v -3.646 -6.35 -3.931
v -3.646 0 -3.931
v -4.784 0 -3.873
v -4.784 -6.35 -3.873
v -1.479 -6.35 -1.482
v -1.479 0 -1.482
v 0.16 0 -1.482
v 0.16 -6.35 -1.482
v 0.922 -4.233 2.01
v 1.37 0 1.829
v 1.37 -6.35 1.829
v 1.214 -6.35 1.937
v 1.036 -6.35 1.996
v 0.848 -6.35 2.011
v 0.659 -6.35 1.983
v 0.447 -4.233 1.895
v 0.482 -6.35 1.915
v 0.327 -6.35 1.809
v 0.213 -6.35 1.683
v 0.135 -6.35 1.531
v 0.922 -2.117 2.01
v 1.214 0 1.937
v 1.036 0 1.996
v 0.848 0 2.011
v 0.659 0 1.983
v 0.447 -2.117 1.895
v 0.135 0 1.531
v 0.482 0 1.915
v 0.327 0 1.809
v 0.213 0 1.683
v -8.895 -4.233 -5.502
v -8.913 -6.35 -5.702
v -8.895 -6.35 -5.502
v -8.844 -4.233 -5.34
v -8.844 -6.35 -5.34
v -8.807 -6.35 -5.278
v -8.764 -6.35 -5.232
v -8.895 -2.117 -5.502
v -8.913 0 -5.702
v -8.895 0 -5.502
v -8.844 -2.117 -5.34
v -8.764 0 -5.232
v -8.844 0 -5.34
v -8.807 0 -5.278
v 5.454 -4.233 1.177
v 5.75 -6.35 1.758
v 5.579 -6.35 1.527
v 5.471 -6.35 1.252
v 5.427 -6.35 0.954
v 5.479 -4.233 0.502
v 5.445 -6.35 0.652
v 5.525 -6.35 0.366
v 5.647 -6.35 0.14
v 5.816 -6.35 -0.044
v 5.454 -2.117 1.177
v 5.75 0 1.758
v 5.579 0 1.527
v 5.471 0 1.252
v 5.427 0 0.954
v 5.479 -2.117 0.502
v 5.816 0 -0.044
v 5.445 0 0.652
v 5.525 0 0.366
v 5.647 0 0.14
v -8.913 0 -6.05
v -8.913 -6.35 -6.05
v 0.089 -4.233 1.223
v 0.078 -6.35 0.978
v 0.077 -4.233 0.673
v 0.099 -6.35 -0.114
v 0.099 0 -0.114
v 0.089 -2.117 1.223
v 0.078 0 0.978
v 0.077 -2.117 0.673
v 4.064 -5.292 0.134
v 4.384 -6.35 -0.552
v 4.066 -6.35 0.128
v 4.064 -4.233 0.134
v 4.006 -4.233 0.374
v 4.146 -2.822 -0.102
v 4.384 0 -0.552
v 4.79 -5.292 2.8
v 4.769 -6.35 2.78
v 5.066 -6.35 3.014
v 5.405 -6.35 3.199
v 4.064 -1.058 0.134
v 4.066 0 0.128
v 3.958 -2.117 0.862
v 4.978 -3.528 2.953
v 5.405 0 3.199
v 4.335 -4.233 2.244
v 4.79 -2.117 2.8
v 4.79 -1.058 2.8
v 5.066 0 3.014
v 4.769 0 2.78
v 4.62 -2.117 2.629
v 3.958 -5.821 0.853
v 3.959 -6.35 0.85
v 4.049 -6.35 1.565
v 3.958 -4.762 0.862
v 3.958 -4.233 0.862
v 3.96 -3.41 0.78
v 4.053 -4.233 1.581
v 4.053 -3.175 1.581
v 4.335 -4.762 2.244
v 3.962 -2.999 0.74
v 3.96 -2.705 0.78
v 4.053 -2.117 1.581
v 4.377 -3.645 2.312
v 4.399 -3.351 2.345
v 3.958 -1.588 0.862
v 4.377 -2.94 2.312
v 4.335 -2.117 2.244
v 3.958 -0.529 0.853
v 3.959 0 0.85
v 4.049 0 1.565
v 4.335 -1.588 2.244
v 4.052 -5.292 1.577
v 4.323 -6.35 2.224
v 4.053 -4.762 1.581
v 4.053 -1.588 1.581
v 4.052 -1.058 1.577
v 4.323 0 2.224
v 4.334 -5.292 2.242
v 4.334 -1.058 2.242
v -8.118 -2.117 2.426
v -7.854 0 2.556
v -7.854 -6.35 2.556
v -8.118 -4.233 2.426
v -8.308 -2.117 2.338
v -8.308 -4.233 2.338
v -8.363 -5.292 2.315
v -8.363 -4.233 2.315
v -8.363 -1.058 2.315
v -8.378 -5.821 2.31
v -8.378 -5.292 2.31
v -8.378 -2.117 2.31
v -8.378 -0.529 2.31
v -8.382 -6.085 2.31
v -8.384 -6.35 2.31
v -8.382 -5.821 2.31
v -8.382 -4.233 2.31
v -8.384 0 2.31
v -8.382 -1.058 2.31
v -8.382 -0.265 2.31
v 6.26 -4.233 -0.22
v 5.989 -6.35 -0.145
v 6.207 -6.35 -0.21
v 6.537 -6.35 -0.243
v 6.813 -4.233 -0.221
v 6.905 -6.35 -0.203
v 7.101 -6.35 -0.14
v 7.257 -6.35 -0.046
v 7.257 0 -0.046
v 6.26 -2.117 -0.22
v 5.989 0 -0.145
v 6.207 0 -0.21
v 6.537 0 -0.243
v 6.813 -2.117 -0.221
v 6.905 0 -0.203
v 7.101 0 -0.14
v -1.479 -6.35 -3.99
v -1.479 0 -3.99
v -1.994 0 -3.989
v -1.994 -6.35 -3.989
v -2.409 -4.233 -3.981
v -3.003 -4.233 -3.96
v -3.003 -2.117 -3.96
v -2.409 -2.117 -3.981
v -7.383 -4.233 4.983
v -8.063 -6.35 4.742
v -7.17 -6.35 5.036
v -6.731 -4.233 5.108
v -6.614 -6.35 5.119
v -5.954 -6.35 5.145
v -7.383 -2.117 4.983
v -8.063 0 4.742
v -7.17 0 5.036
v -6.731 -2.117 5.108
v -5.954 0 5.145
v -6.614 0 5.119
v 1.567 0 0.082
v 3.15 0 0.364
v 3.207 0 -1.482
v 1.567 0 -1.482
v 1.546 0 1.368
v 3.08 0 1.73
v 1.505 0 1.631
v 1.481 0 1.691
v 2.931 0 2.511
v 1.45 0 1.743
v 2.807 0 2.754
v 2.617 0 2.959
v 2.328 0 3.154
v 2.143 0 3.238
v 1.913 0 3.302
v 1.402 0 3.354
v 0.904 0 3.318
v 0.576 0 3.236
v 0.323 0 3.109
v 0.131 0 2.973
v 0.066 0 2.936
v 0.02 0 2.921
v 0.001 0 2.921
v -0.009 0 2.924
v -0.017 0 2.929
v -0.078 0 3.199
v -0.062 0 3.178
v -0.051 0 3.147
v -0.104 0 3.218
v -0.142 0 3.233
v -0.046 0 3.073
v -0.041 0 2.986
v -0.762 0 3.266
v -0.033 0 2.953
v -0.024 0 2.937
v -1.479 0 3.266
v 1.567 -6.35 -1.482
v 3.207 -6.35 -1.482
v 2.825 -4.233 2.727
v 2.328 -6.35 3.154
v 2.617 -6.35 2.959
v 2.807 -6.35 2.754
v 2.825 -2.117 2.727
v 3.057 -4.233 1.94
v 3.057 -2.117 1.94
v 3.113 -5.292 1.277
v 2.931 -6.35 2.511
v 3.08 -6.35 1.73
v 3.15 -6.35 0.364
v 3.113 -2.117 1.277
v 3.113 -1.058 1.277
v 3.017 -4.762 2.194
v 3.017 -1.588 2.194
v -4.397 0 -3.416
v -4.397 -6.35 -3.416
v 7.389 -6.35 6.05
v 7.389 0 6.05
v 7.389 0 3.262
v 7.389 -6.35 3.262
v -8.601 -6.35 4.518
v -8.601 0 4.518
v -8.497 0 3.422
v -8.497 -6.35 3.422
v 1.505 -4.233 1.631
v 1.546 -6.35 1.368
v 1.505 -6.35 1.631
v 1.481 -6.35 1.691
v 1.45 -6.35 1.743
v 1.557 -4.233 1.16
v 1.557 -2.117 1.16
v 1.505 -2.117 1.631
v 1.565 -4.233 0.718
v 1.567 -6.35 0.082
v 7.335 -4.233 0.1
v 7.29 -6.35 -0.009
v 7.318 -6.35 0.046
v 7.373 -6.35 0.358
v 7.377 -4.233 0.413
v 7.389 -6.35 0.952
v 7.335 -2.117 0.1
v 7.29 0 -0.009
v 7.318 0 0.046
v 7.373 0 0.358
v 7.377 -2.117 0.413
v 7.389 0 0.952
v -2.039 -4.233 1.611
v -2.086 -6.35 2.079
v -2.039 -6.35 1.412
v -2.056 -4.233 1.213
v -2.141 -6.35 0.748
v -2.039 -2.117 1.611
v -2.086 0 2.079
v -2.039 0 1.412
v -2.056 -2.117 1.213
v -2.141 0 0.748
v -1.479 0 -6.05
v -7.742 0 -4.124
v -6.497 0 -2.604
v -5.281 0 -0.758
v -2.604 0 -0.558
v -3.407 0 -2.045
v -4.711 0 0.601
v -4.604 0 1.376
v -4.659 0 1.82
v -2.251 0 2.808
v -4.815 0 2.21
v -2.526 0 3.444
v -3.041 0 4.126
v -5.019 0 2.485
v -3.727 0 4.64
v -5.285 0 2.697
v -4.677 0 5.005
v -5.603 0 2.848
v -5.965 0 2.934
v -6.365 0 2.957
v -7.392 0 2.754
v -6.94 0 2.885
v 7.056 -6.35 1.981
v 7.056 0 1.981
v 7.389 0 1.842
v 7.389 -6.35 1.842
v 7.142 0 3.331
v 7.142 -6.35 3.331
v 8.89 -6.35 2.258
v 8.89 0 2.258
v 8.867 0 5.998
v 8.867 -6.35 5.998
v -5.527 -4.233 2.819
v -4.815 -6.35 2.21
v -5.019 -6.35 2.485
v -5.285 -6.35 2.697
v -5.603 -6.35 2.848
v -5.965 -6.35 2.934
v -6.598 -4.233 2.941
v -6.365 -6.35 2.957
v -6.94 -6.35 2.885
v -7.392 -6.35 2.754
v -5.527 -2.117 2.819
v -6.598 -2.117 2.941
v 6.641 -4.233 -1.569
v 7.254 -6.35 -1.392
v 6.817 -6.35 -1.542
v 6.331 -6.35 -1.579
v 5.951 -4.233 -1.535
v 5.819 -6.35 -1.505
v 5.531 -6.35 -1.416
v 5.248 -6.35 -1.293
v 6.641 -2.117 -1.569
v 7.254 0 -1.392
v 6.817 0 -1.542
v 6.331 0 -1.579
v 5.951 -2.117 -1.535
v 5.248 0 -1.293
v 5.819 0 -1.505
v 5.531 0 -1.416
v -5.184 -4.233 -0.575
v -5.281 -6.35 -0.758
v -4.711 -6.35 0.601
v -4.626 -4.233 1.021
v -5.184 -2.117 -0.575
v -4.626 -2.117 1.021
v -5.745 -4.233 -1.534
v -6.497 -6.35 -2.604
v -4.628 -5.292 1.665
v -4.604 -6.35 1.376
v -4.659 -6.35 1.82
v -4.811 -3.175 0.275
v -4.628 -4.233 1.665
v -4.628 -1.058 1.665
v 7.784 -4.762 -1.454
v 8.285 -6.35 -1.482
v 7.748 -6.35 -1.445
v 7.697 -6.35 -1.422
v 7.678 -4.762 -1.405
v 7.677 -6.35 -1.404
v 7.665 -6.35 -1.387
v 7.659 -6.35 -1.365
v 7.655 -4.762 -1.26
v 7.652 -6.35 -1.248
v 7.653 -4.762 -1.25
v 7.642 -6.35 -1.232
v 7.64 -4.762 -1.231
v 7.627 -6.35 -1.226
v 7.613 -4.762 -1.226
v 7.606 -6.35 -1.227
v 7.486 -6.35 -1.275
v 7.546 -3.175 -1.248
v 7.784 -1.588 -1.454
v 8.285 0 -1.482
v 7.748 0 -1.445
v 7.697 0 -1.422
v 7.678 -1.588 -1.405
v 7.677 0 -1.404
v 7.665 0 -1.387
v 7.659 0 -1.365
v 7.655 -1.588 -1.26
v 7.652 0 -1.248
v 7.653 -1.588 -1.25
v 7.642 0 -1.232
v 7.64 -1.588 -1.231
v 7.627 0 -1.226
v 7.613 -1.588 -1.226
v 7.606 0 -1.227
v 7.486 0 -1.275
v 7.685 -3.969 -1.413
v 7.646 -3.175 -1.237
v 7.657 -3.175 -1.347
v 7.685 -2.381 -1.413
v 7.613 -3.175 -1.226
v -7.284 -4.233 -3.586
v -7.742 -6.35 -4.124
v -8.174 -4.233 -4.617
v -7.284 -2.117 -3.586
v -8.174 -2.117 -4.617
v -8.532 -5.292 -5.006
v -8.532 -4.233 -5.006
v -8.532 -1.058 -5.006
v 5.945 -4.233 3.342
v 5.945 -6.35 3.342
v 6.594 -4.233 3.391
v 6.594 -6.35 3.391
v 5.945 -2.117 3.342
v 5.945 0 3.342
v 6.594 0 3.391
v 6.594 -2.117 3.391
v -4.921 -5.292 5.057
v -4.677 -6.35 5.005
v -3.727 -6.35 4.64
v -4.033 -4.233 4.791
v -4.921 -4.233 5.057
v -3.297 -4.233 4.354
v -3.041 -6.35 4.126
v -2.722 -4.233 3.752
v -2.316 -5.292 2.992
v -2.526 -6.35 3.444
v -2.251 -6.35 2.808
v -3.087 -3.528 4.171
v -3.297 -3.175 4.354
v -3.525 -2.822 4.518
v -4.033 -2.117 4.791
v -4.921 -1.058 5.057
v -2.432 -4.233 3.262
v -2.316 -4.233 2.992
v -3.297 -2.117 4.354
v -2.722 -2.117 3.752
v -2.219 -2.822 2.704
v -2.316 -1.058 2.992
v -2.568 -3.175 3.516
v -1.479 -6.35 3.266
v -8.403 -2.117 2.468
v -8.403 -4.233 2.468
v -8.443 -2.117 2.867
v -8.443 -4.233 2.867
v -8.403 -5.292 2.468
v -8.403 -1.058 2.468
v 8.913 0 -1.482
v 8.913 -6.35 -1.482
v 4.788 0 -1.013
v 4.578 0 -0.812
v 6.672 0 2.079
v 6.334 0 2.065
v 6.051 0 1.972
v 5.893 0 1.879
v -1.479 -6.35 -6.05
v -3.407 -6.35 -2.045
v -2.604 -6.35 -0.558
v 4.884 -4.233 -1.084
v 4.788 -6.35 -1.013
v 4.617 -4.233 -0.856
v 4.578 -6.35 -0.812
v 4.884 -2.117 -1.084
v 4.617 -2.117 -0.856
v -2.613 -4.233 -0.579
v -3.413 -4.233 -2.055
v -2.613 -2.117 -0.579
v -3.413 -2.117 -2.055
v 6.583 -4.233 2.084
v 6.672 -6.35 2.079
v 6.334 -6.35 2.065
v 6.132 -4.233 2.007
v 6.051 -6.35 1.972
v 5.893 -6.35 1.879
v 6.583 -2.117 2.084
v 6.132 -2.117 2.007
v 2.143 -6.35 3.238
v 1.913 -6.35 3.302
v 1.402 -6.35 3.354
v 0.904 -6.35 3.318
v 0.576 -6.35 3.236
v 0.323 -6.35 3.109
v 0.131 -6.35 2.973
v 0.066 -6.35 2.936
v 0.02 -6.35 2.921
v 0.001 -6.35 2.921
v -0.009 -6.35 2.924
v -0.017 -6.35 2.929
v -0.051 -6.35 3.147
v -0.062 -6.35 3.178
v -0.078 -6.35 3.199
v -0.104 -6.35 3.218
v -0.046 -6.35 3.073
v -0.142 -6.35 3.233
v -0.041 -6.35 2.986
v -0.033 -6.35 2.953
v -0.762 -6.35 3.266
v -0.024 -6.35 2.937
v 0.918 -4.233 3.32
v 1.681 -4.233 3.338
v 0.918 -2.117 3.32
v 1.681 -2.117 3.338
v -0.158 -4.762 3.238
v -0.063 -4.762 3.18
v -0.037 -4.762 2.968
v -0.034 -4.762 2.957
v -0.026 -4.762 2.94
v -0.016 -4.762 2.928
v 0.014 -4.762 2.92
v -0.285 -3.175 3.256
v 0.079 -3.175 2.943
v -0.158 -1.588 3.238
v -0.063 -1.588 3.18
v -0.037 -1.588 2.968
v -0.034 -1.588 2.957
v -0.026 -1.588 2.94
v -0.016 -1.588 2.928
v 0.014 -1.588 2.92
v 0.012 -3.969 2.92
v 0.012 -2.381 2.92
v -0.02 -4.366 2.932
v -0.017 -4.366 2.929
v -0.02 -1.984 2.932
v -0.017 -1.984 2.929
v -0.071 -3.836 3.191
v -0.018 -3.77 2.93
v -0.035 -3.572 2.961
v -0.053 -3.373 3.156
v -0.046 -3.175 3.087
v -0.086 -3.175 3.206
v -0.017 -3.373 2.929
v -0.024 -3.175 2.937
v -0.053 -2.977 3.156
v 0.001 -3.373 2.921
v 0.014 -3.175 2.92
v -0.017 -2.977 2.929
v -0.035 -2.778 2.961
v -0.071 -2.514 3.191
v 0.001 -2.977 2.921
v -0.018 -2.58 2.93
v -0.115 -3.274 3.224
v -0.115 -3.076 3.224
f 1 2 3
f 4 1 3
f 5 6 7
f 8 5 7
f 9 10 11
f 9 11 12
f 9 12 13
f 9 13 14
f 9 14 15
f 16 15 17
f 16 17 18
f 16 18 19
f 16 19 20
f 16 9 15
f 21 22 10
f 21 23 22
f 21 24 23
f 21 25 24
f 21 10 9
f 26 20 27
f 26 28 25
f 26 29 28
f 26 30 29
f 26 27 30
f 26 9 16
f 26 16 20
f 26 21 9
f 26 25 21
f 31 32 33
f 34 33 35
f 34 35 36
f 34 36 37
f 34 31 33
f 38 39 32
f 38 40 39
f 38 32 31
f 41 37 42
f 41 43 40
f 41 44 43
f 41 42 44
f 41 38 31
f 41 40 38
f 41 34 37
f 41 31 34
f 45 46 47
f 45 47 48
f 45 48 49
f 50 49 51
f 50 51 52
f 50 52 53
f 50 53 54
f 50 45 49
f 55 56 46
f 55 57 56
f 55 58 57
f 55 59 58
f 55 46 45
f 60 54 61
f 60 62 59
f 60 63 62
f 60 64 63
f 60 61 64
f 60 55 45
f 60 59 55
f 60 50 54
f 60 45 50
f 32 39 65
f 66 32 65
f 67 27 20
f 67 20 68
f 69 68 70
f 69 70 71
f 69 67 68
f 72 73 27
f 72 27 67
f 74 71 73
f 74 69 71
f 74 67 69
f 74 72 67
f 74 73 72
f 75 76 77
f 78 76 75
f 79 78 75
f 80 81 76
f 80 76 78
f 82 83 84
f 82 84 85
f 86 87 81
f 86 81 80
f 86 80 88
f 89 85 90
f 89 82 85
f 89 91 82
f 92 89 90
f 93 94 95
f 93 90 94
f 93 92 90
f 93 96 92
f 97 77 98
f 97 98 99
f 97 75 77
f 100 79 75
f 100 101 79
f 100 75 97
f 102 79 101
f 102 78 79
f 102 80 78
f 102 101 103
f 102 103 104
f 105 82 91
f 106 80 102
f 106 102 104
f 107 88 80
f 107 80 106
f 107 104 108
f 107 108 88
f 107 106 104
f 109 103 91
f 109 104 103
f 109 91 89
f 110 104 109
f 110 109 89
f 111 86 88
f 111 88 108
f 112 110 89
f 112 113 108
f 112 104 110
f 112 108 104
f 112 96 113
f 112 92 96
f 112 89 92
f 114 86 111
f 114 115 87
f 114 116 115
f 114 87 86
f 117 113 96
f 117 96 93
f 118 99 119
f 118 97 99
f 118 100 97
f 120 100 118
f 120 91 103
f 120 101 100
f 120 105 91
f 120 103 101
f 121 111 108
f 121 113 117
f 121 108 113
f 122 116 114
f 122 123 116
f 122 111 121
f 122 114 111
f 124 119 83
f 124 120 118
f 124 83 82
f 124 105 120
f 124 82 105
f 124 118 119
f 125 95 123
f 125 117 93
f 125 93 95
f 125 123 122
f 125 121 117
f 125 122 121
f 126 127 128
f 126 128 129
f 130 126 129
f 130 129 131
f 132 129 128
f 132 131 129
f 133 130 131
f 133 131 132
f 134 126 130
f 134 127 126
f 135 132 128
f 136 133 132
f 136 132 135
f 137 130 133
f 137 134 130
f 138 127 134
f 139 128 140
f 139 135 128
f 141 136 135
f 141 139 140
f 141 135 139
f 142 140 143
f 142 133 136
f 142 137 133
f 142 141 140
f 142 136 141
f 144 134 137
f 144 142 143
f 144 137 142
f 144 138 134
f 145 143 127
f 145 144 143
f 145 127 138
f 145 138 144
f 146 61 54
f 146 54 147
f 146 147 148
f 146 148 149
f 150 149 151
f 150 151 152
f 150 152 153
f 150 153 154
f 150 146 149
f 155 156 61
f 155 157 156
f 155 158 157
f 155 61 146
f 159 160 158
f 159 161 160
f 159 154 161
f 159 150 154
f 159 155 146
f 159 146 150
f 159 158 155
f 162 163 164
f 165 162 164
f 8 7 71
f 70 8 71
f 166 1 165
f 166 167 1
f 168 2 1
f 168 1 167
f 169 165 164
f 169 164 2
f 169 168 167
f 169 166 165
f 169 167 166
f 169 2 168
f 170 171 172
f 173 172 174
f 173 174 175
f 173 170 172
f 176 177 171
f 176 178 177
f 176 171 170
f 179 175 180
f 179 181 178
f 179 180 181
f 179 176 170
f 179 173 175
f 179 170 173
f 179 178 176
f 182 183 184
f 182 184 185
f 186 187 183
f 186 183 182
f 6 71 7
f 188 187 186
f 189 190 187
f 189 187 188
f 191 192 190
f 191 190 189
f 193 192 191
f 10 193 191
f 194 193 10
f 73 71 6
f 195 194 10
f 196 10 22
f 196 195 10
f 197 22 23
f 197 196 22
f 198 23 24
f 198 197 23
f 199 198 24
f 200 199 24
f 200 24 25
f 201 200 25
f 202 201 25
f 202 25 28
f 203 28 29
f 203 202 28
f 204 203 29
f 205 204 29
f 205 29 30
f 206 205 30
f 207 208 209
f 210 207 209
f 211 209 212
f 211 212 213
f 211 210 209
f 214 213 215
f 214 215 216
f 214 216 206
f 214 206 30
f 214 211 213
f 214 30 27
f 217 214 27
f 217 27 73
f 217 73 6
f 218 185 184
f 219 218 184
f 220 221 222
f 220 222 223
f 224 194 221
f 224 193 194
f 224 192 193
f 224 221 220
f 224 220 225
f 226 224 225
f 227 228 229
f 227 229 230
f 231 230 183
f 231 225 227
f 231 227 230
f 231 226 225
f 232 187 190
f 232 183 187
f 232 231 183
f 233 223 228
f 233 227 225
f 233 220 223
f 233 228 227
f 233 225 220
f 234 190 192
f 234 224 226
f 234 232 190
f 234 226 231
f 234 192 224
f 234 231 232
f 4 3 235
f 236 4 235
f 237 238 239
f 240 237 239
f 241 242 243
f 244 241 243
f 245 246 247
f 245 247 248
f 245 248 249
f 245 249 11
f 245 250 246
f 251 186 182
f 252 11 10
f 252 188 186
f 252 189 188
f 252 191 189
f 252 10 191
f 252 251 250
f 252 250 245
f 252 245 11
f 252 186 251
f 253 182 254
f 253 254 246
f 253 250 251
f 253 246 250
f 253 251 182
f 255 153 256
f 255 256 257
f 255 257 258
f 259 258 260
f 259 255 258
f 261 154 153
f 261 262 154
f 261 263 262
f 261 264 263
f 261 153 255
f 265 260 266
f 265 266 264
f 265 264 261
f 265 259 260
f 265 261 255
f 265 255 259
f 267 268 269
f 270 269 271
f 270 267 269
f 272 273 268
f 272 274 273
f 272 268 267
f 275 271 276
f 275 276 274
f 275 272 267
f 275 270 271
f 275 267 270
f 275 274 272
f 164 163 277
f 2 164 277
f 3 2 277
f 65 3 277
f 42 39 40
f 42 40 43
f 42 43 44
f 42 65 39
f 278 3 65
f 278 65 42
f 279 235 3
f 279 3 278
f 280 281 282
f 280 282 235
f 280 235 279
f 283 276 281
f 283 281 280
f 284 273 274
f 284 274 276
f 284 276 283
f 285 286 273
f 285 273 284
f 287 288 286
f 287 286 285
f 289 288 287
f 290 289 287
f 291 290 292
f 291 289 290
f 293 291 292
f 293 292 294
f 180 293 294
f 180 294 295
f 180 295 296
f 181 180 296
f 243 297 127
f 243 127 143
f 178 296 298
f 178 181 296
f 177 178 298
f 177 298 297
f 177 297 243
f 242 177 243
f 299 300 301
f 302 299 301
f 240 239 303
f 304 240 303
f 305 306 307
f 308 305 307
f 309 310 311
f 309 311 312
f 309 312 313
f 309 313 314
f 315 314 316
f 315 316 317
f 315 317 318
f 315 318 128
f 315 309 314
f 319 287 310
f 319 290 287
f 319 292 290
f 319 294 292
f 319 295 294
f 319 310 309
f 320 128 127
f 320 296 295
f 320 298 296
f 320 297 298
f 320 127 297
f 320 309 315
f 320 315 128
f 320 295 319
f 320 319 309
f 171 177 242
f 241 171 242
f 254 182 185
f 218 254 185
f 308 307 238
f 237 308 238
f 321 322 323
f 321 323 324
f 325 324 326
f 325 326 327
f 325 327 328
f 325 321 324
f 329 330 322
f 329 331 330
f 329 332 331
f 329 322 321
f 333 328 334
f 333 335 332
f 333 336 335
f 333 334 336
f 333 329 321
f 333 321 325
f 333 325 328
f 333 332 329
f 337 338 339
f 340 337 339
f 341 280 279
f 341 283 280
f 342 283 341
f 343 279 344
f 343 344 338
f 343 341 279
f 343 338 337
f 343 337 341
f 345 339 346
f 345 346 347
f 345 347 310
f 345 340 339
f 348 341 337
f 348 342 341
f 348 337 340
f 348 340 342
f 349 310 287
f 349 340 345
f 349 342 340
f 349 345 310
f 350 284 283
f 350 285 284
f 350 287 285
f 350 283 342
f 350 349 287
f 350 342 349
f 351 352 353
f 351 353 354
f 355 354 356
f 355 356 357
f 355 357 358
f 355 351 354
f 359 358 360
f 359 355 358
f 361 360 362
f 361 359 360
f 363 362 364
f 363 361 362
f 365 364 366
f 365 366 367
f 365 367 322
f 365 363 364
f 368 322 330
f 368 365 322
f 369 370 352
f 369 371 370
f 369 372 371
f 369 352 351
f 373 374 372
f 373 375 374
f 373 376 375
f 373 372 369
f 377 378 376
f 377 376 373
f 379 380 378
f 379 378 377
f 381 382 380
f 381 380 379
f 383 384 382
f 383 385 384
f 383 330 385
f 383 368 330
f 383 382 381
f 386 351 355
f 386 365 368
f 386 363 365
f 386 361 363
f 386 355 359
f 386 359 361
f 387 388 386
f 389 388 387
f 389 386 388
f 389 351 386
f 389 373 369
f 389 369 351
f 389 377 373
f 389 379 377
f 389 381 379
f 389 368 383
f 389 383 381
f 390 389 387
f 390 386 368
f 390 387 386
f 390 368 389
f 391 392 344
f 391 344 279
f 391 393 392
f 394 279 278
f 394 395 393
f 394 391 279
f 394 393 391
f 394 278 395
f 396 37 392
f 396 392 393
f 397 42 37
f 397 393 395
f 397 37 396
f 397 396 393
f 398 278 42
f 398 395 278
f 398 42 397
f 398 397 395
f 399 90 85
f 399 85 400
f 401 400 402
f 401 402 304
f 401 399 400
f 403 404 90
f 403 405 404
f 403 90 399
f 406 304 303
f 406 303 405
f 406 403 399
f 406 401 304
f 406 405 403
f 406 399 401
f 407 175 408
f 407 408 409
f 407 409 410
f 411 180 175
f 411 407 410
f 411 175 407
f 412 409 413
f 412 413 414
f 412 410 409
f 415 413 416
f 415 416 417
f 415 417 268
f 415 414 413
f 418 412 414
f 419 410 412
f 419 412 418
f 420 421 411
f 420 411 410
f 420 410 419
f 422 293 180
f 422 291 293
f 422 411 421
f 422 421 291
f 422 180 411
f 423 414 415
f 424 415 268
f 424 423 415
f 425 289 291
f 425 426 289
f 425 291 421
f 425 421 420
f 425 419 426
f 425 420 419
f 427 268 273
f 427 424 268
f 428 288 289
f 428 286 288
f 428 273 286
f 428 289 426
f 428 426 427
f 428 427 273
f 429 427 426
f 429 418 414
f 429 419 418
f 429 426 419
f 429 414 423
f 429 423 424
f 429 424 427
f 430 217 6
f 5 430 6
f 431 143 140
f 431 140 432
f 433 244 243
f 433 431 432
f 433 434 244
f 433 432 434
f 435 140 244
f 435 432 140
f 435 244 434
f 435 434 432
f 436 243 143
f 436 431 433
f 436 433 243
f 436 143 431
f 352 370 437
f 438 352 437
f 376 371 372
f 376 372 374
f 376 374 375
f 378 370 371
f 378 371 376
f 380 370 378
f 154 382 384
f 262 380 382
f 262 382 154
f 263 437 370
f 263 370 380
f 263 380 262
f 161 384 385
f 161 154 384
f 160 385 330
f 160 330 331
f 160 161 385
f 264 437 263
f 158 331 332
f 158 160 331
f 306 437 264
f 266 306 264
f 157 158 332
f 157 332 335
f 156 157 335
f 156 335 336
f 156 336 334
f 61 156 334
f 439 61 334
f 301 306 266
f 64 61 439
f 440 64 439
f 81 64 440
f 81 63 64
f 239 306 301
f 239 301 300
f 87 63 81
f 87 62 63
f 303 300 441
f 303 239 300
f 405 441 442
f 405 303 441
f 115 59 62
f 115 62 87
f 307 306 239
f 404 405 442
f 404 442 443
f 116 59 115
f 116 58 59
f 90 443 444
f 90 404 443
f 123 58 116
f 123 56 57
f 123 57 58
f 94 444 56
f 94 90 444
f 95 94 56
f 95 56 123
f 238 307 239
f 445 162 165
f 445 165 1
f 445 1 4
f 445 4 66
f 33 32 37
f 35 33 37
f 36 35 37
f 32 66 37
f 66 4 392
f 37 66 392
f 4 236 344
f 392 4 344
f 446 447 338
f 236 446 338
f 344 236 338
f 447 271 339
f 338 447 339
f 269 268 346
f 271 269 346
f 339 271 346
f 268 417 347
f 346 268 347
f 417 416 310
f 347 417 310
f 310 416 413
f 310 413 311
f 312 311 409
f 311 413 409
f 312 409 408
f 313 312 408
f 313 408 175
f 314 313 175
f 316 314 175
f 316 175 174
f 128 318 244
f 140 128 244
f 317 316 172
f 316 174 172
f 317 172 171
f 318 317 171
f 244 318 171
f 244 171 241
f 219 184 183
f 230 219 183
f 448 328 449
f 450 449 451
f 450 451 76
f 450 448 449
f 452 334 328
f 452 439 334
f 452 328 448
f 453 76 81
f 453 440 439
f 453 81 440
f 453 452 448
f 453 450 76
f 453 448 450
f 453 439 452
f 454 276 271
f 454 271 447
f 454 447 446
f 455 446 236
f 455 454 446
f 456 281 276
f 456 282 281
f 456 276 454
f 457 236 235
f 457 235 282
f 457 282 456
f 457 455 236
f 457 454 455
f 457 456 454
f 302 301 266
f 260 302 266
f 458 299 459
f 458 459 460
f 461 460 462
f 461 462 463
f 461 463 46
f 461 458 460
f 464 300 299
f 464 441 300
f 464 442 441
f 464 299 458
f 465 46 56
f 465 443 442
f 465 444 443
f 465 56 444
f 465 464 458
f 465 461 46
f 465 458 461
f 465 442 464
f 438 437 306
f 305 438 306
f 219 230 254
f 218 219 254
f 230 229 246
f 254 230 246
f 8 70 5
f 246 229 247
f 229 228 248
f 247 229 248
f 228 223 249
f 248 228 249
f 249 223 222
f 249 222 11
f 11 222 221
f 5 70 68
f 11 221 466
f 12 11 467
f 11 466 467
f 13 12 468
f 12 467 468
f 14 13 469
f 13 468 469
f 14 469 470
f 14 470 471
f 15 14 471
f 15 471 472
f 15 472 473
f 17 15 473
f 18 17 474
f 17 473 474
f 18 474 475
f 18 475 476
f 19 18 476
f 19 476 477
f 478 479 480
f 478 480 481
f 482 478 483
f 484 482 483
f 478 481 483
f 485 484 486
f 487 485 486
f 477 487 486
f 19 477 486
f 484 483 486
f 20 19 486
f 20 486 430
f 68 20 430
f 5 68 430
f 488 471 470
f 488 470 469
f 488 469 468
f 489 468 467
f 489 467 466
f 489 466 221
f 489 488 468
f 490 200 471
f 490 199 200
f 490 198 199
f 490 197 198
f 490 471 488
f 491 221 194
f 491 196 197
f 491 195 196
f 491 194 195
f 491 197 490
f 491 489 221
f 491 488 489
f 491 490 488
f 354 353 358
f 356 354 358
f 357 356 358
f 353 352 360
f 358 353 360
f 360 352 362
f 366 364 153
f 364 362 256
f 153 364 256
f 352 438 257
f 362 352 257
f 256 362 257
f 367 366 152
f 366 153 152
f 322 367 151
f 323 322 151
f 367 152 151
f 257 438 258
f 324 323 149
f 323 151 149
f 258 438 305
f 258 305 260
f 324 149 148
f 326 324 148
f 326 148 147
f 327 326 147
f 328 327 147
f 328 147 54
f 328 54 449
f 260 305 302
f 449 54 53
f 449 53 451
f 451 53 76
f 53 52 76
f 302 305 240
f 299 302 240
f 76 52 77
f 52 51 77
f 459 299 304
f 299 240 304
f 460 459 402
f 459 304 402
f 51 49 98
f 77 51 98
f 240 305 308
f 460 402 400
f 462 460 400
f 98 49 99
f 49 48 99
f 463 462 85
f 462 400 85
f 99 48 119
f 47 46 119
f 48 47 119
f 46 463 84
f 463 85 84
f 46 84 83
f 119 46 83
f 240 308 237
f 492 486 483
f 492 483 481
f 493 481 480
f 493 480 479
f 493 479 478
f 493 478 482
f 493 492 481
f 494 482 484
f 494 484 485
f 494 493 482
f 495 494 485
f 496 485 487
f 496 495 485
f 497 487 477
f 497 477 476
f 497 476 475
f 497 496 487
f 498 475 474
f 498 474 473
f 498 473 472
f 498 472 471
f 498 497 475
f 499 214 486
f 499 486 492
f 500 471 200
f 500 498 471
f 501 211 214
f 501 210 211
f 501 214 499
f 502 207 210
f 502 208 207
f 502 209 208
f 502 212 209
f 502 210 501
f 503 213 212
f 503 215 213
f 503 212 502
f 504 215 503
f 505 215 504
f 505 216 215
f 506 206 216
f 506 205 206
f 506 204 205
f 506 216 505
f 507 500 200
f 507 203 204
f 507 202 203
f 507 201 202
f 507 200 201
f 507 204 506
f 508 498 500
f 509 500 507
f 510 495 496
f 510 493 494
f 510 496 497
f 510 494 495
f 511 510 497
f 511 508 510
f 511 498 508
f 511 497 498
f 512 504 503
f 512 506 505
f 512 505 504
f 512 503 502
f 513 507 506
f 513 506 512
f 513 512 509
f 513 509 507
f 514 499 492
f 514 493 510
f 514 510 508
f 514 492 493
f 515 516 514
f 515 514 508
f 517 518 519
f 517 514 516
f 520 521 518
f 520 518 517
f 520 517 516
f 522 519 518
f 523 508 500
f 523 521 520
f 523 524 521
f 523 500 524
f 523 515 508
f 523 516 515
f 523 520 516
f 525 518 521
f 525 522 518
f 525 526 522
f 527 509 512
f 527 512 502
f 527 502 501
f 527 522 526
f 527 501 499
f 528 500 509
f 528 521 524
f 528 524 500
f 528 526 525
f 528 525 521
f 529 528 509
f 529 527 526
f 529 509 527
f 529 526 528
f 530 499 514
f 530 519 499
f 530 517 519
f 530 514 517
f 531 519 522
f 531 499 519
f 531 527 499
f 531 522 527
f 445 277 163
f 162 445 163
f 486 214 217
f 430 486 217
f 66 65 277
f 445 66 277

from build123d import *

# Parameters (mm, degrees)
F1_DEPTH = 6.35


# Not quite as in the source:
# - ends of sketch curves that miss each other by under 0.0002 mm in the source are joined


with BuildPart() as f1:
    # F0 (on Front) → F1 (new body)
    with BuildSketch(Plane.XZ):
        with BuildLine():
            add(Edge.make_bspline(
                [(-8.9133755493, -5.7023881004), (-8.9133755493, -5.4868837545), (-8.8566497364, -5.3084137598), (-8.7639088993, -5.2321362172)],
                knots=[0, 0, 0, 0, 1, 1, 1, 1], degree=3))
            Line((-8.9133755493, -5.7023881004), (-8.9133755493, -6.0497027056))
            Line((-8.9133755493, -6.0497027056), (-5.196146377, -6.0497027056))
            Line((-5.196146377, -6.0497027056), (-1.4789172047, -6.0497027056))
            Line((-1.4789172047, -6.0497027056), (-1.4789172047, -5.0196271518))
            Line((-1.4789172047, -5.0196271518), (-1.4789172047, -3.9895515981))
            Line((-1.4789172047, -3.9895515981), (-1.9939549816, -3.9891933109))
            add(Edge.make_bspline(
                [(-3.6463520247, -3.9308220643), (-3.0208050553, -3.9627266392), (-2.2772257589, -3.9889935658), (-1.9939549816, -3.9891933109)],
                knots=[0, 0, 0, 0, 1, 1, 1, 1], degree=3))
            Line((-3.6463520247, -3.9308220643), (-4.7837121867, -3.8728135834))
            Line((-4.7837121867, -3.8728135834), (-4.3970773583, -3.4161479489))
            add(Edge.make_bspline(
                [(-2.1407595581, 0.7483248017), (-2.4010757734, -0.4154115645), (-3.3689284937, -2.2017703813), (-4.3970773583, -3.4161479489)],
                knots=[0, 0, 0, 0, 1, 1, 1, 1], degree=3))
            add(Edge.make_bspline(
                [(-2.0863554459, 2.0788707074), (-2.0094715023, 1.5309663546), (-2.0192652815, 1.2914603526), (-2.1407595581, 0.7483248017)],
                knots=[0, 0, 0, 0, 1, 1, 1, 1], degree=3))
            add(Edge.make_bspline(
                [(-5.9539326546, 5.1445753005), (-3.749439299, 5.1508811543), (-2.3632442333, 4.0520932911), (-2.0863554459, 2.0788707074)],
                knots=[0, 0, 0, 0, 1, 1, 1, 1], degree=3))
            add(Edge.make_bspline(
                [(-8.0628135016, 4.7419178708), (-7.318555251, 5.0513462971), (-6.8436142847, 5.1420287746), (-5.9539326546, 5.1445753005)],
                knots=[0, 0, 0, 0, 1, 1, 1, 1], degree=3))
            Line((-8.0628135016, 4.7419178708), (-8.6006141568, 4.5183251925))
            Line((-8.6006141568, 4.5183251925), (-8.4965111385, 3.4217900597))
            add(Edge.make_bspline(
                [(-8.3841755772, 2.3100098088), (-8.3886989524, 2.318393728), (-8.4392541649, 2.8186951545), (-8.4965111385, 3.4217900597)],
                knots=[0, 0, 0, 0, 1, 1, 1, 1], degree=3))
            add(Edge.make_bspline(
                [(-7.8535836594, 2.5557930016), (-8.14088248, 2.4122282367), (-8.379648619, 2.3016258895), (-8.3841755772, 2.3100098088)],
                knots=[0, 0, 0, 0, 1, 1, 1, 1], degree=3))
            add(Edge.make_bspline(
                [(-4.8147631425, 2.2103388025), (-5.2902934912, 3.056431218), (-6.562335584, 3.2010377028), (-7.8535836594, 2.5557930016)],
                knots=[0, 0, 0, 0, 1, 1, 1, 1], degree=3))
            add(Edge.make_bspline(
                [(-6.496803073, -2.6036763037), (-4.8035326318, -0.3508383673), (-4.2560107506, 1.2161734739), (-4.8147631425, 2.2103388025)],
                knots=[0, 0, 0, 0, 1, 1, 1, 1], degree=3))
            add(Edge.make_bspline(
                [(-8.7639088993, -5.2321362172), (-8.4579039067, -4.9804556178), (-7.0994528064, -3.4054817404), (-6.496803073, -2.6036763037)],
                knots=[0, 0, 0, 0, 1, 1, 1, 1], degree=3))
        make_face()
    extrude(amount=F1_DEPTH)


with BuildPart() as f1b:
    # F0 (on Front) → F1, piece 2 (new body)
    with BuildSketch(Plane.XZ):
        with BuildLine():
            add(Edge.make_bspline(
                [(5.247696732, -1.2926256975), (4.814993342, -1.0764011944), (4.6218004326, -0.9108411814), (4.3836586089, -0.5521733522)],
                knots=[0, 0, 0, 0, 1, 1, 1, 1], degree=3))
            add(Edge.make_bspline(
                [(7.2543322795, -1.3919751411), (6.6989639097, -1.6751178307), (5.9377067253, -1.6374278141), (5.247696732, -1.2926256975)],
                knots=[0, 0, 0, 0, 1, 1, 1, 1], degree=3))
            add(Edge.make_bspline(
                [(7.6574053223, -1.3471892475), (7.6574053223, -1.1796102863), (7.6746272899, -1.177697033), (7.2543322795, -1.3919751411)],
                knots=[0, 0, 0, 0, 1, 1, 1, 1], degree=3))
            add(Edge.make_bspline(
                [(8.2853904358, -1.4815469284), (7.7868956723, -1.4815469284), (7.6574053223, -1.4538423746), (7.6574053223, -1.3471892475)],
                knots=[0, 0, 0, 0, 1, 1, 1, 1], degree=3))
            Line((8.2853904358, -1.4815469284), (8.9133755493, -1.4815469284))
            Line((8.9133755493, -1.4815469284), (8.89, 2.2580751908))
            Line((8.89, 2.2580751908), (8.8666244507, 5.9976976458))
            Line((8.8666244507, 5.9976976458), (8.1276572056, 6.0237128757))
            Line((8.1276572056, 6.0237128757), (7.3886899605, 6.0497281056))
            Line((7.3886899605, 6.0497281056), (7.3886899605, 4.6560364412))
            Line((7.3886899605, 4.6560364412), (7.3886899605, 3.2623451126))
            Line((7.3886899605, 3.2623451126), (7.1423675454, 3.3312302956))
            add(Edge.make_bspline(
                [(5.4051066081, 3.1994728837), (5.8193537314, 3.3827134718), (6.7152928465, 3.4506635254), (7.1423675454, 3.3312302956)],
                knots=[0, 0, 0, 0, 1, 1, 1, 1], degree=3))
            add(Edge.make_bspline(
                [(4.3836586089, -0.5521733522), (3.521845225, 0.7458114174), (4.0234991855, 2.5883218919), (5.4051066081, 3.1994728837)],
                knots=[0, 0, 0, 0, 1, 1, 1, 1], degree=3))
        make_face()
        with BuildLine():
            add(Edge.make_bspline(
                [(7.2568716397, -0.0462907077), (7.3567182067, 0.0365739442), (7.3886899605, 0.2788091986), (7.3886899605, 0.9524293463)],
                knots=[0, 0, 0, 0, 1, 1, 1, 1], degree=3))
            add(Edge.make_bspline(
                [(5.8158299773, -0.0439546755), (6.1336315743, -0.3077077603), (6.9403079248, -0.3090146127), (7.2568716397, -0.0462907077)],
                knots=[0, 0, 0, 0, 1, 1, 1, 1], degree=3))
            add(Edge.make_bspline(
                [(5.7500197937, 1.7580003809), (5.291141736, 1.2991214275), (5.3253250172, 0.3631276005), (5.8158299773, -0.0439546755)],
                knots=[0, 0, 0, 0, 1, 1, 1, 1], degree=3))
            add(Edge.make_bspline(
                [(7.0559988453, 1.9807573545), (6.5865208623, 2.1769177772), (6.0830638217, 2.091044409), (5.7500197937, 1.7580003809)],
                knots=[0, 0, 0, 0, 1, 1, 1, 1], degree=3))
            Line((7.0559988453, 1.9807573545), (7.3886899605, 1.8417500021))
            Line((7.3886899605, 1.8417500021), (7.3886899605, 0.9524293463))
        make_face(mode=Mode.SUBTRACT)
    extrude(amount=F1_DEPTH)


with BuildPart() as f1c:
    # F0 (on Front) → F1, piece 3 (new body)
    with BuildSketch(Plane.XZ):
        with BuildLine():
            add(Edge.make_bspline(
                [(-0.7623429064, 3.2657577977), (-0.1054834315, 3.2657577977), (-0.0457686081, 3.2508288679), (-0.0457686081, 3.0866142232)],
                knots=[0, 0, 0, 0, 1, 1, 1, 1], degree=3))
            Line((-0.7623429064, 3.2657577977), (-1.4789172047, 3.2657577977))
            Line((-1.4789172047, 3.2657577977), (-1.4789172047, 0.8921054347))
            Line((-1.4789172047, 0.8921054347), (-1.4789172047, -1.4815469284))
            Line((-1.4789172047, -1.4815469284), (-0.6592341349, -1.4815469284))
            Line((-0.6592341349, -1.4815469284), (0.1604498306, -1.4815469284))
            Line((0.1604498306, -1.4815469284), (0.0994514435, -0.1142237426))
            add(Edge.make_bspline(
                [(0.1351583407, 1.5305086428), (0.0712811164, 1.3472698461), (0.0591602621, 0.7889438158), (0.0994514435, -0.1142237426)],
                knots=[0, 0, 0, 0, 1, 1, 1, 1], degree=3))
            add(Edge.make_bspline(
                [(1.3704903322, 1.82912038), (1.0003653757, 2.1739439938), (0.3004854671, 2.0047652806), (0.1351583407, 1.5305086428)],
                knots=[0, 0, 0, 0, 1, 1, 1, 1], degree=3))
            add(Edge.make_bspline(
                [(1.566523563, 0.082470528), (1.566523563, 1.576057688), (1.557700742, 1.6547115702), (1.3704903322, 1.82912038)],
                knots=[0, 0, 0, 0, 1, 1, 1, 1], degree=3))
            Line((1.566523563, 0.082470528), (1.566523563, -1.4815469284))
            Line((1.566523563, -1.4815469284), (2.3868927527, -1.4815469284))
            Line((2.3868927527, -1.4815469284), (3.2072610466, -1.4815469284))
            Line((3.2072610466, -1.4815469284), (3.1498509053, 0.3639435995))
            add(Edge.make_bspline(
                [(2.3276293711, 3.1544155875), (2.9988973636, 2.7652405033), (3.0841499993, 2.4759084031), (3.1498509053, 0.3639435995)],
                knots=[0, 0, 0, 0, 1, 1, 1, 1], degree=3))
            add(Edge.make_bspline(
                [(0.3231838537, 3.1086623186), (0.7379809478, 3.415334621), (1.8344148644, 3.4403618741), (2.3276293711, 3.1544155875)],
                knots=[0, 0, 0, 0, 1, 1, 1, 1], degree=3))
            add(Edge.make_bspline(
                [(-0.0457686081, 3.0866142232), (-0.0457686081, 2.8600692588), (-0.0101799456, 2.8621965887), (0.3231838537, 3.1086623186)],
                knots=[0, 0, 0, 0, 1, 1, 1, 1], degree=3))
        make_face()
    extrude(amount=F1_DEPTH)


solid = Compound([f1.part, f1b.part, f1c.part])
